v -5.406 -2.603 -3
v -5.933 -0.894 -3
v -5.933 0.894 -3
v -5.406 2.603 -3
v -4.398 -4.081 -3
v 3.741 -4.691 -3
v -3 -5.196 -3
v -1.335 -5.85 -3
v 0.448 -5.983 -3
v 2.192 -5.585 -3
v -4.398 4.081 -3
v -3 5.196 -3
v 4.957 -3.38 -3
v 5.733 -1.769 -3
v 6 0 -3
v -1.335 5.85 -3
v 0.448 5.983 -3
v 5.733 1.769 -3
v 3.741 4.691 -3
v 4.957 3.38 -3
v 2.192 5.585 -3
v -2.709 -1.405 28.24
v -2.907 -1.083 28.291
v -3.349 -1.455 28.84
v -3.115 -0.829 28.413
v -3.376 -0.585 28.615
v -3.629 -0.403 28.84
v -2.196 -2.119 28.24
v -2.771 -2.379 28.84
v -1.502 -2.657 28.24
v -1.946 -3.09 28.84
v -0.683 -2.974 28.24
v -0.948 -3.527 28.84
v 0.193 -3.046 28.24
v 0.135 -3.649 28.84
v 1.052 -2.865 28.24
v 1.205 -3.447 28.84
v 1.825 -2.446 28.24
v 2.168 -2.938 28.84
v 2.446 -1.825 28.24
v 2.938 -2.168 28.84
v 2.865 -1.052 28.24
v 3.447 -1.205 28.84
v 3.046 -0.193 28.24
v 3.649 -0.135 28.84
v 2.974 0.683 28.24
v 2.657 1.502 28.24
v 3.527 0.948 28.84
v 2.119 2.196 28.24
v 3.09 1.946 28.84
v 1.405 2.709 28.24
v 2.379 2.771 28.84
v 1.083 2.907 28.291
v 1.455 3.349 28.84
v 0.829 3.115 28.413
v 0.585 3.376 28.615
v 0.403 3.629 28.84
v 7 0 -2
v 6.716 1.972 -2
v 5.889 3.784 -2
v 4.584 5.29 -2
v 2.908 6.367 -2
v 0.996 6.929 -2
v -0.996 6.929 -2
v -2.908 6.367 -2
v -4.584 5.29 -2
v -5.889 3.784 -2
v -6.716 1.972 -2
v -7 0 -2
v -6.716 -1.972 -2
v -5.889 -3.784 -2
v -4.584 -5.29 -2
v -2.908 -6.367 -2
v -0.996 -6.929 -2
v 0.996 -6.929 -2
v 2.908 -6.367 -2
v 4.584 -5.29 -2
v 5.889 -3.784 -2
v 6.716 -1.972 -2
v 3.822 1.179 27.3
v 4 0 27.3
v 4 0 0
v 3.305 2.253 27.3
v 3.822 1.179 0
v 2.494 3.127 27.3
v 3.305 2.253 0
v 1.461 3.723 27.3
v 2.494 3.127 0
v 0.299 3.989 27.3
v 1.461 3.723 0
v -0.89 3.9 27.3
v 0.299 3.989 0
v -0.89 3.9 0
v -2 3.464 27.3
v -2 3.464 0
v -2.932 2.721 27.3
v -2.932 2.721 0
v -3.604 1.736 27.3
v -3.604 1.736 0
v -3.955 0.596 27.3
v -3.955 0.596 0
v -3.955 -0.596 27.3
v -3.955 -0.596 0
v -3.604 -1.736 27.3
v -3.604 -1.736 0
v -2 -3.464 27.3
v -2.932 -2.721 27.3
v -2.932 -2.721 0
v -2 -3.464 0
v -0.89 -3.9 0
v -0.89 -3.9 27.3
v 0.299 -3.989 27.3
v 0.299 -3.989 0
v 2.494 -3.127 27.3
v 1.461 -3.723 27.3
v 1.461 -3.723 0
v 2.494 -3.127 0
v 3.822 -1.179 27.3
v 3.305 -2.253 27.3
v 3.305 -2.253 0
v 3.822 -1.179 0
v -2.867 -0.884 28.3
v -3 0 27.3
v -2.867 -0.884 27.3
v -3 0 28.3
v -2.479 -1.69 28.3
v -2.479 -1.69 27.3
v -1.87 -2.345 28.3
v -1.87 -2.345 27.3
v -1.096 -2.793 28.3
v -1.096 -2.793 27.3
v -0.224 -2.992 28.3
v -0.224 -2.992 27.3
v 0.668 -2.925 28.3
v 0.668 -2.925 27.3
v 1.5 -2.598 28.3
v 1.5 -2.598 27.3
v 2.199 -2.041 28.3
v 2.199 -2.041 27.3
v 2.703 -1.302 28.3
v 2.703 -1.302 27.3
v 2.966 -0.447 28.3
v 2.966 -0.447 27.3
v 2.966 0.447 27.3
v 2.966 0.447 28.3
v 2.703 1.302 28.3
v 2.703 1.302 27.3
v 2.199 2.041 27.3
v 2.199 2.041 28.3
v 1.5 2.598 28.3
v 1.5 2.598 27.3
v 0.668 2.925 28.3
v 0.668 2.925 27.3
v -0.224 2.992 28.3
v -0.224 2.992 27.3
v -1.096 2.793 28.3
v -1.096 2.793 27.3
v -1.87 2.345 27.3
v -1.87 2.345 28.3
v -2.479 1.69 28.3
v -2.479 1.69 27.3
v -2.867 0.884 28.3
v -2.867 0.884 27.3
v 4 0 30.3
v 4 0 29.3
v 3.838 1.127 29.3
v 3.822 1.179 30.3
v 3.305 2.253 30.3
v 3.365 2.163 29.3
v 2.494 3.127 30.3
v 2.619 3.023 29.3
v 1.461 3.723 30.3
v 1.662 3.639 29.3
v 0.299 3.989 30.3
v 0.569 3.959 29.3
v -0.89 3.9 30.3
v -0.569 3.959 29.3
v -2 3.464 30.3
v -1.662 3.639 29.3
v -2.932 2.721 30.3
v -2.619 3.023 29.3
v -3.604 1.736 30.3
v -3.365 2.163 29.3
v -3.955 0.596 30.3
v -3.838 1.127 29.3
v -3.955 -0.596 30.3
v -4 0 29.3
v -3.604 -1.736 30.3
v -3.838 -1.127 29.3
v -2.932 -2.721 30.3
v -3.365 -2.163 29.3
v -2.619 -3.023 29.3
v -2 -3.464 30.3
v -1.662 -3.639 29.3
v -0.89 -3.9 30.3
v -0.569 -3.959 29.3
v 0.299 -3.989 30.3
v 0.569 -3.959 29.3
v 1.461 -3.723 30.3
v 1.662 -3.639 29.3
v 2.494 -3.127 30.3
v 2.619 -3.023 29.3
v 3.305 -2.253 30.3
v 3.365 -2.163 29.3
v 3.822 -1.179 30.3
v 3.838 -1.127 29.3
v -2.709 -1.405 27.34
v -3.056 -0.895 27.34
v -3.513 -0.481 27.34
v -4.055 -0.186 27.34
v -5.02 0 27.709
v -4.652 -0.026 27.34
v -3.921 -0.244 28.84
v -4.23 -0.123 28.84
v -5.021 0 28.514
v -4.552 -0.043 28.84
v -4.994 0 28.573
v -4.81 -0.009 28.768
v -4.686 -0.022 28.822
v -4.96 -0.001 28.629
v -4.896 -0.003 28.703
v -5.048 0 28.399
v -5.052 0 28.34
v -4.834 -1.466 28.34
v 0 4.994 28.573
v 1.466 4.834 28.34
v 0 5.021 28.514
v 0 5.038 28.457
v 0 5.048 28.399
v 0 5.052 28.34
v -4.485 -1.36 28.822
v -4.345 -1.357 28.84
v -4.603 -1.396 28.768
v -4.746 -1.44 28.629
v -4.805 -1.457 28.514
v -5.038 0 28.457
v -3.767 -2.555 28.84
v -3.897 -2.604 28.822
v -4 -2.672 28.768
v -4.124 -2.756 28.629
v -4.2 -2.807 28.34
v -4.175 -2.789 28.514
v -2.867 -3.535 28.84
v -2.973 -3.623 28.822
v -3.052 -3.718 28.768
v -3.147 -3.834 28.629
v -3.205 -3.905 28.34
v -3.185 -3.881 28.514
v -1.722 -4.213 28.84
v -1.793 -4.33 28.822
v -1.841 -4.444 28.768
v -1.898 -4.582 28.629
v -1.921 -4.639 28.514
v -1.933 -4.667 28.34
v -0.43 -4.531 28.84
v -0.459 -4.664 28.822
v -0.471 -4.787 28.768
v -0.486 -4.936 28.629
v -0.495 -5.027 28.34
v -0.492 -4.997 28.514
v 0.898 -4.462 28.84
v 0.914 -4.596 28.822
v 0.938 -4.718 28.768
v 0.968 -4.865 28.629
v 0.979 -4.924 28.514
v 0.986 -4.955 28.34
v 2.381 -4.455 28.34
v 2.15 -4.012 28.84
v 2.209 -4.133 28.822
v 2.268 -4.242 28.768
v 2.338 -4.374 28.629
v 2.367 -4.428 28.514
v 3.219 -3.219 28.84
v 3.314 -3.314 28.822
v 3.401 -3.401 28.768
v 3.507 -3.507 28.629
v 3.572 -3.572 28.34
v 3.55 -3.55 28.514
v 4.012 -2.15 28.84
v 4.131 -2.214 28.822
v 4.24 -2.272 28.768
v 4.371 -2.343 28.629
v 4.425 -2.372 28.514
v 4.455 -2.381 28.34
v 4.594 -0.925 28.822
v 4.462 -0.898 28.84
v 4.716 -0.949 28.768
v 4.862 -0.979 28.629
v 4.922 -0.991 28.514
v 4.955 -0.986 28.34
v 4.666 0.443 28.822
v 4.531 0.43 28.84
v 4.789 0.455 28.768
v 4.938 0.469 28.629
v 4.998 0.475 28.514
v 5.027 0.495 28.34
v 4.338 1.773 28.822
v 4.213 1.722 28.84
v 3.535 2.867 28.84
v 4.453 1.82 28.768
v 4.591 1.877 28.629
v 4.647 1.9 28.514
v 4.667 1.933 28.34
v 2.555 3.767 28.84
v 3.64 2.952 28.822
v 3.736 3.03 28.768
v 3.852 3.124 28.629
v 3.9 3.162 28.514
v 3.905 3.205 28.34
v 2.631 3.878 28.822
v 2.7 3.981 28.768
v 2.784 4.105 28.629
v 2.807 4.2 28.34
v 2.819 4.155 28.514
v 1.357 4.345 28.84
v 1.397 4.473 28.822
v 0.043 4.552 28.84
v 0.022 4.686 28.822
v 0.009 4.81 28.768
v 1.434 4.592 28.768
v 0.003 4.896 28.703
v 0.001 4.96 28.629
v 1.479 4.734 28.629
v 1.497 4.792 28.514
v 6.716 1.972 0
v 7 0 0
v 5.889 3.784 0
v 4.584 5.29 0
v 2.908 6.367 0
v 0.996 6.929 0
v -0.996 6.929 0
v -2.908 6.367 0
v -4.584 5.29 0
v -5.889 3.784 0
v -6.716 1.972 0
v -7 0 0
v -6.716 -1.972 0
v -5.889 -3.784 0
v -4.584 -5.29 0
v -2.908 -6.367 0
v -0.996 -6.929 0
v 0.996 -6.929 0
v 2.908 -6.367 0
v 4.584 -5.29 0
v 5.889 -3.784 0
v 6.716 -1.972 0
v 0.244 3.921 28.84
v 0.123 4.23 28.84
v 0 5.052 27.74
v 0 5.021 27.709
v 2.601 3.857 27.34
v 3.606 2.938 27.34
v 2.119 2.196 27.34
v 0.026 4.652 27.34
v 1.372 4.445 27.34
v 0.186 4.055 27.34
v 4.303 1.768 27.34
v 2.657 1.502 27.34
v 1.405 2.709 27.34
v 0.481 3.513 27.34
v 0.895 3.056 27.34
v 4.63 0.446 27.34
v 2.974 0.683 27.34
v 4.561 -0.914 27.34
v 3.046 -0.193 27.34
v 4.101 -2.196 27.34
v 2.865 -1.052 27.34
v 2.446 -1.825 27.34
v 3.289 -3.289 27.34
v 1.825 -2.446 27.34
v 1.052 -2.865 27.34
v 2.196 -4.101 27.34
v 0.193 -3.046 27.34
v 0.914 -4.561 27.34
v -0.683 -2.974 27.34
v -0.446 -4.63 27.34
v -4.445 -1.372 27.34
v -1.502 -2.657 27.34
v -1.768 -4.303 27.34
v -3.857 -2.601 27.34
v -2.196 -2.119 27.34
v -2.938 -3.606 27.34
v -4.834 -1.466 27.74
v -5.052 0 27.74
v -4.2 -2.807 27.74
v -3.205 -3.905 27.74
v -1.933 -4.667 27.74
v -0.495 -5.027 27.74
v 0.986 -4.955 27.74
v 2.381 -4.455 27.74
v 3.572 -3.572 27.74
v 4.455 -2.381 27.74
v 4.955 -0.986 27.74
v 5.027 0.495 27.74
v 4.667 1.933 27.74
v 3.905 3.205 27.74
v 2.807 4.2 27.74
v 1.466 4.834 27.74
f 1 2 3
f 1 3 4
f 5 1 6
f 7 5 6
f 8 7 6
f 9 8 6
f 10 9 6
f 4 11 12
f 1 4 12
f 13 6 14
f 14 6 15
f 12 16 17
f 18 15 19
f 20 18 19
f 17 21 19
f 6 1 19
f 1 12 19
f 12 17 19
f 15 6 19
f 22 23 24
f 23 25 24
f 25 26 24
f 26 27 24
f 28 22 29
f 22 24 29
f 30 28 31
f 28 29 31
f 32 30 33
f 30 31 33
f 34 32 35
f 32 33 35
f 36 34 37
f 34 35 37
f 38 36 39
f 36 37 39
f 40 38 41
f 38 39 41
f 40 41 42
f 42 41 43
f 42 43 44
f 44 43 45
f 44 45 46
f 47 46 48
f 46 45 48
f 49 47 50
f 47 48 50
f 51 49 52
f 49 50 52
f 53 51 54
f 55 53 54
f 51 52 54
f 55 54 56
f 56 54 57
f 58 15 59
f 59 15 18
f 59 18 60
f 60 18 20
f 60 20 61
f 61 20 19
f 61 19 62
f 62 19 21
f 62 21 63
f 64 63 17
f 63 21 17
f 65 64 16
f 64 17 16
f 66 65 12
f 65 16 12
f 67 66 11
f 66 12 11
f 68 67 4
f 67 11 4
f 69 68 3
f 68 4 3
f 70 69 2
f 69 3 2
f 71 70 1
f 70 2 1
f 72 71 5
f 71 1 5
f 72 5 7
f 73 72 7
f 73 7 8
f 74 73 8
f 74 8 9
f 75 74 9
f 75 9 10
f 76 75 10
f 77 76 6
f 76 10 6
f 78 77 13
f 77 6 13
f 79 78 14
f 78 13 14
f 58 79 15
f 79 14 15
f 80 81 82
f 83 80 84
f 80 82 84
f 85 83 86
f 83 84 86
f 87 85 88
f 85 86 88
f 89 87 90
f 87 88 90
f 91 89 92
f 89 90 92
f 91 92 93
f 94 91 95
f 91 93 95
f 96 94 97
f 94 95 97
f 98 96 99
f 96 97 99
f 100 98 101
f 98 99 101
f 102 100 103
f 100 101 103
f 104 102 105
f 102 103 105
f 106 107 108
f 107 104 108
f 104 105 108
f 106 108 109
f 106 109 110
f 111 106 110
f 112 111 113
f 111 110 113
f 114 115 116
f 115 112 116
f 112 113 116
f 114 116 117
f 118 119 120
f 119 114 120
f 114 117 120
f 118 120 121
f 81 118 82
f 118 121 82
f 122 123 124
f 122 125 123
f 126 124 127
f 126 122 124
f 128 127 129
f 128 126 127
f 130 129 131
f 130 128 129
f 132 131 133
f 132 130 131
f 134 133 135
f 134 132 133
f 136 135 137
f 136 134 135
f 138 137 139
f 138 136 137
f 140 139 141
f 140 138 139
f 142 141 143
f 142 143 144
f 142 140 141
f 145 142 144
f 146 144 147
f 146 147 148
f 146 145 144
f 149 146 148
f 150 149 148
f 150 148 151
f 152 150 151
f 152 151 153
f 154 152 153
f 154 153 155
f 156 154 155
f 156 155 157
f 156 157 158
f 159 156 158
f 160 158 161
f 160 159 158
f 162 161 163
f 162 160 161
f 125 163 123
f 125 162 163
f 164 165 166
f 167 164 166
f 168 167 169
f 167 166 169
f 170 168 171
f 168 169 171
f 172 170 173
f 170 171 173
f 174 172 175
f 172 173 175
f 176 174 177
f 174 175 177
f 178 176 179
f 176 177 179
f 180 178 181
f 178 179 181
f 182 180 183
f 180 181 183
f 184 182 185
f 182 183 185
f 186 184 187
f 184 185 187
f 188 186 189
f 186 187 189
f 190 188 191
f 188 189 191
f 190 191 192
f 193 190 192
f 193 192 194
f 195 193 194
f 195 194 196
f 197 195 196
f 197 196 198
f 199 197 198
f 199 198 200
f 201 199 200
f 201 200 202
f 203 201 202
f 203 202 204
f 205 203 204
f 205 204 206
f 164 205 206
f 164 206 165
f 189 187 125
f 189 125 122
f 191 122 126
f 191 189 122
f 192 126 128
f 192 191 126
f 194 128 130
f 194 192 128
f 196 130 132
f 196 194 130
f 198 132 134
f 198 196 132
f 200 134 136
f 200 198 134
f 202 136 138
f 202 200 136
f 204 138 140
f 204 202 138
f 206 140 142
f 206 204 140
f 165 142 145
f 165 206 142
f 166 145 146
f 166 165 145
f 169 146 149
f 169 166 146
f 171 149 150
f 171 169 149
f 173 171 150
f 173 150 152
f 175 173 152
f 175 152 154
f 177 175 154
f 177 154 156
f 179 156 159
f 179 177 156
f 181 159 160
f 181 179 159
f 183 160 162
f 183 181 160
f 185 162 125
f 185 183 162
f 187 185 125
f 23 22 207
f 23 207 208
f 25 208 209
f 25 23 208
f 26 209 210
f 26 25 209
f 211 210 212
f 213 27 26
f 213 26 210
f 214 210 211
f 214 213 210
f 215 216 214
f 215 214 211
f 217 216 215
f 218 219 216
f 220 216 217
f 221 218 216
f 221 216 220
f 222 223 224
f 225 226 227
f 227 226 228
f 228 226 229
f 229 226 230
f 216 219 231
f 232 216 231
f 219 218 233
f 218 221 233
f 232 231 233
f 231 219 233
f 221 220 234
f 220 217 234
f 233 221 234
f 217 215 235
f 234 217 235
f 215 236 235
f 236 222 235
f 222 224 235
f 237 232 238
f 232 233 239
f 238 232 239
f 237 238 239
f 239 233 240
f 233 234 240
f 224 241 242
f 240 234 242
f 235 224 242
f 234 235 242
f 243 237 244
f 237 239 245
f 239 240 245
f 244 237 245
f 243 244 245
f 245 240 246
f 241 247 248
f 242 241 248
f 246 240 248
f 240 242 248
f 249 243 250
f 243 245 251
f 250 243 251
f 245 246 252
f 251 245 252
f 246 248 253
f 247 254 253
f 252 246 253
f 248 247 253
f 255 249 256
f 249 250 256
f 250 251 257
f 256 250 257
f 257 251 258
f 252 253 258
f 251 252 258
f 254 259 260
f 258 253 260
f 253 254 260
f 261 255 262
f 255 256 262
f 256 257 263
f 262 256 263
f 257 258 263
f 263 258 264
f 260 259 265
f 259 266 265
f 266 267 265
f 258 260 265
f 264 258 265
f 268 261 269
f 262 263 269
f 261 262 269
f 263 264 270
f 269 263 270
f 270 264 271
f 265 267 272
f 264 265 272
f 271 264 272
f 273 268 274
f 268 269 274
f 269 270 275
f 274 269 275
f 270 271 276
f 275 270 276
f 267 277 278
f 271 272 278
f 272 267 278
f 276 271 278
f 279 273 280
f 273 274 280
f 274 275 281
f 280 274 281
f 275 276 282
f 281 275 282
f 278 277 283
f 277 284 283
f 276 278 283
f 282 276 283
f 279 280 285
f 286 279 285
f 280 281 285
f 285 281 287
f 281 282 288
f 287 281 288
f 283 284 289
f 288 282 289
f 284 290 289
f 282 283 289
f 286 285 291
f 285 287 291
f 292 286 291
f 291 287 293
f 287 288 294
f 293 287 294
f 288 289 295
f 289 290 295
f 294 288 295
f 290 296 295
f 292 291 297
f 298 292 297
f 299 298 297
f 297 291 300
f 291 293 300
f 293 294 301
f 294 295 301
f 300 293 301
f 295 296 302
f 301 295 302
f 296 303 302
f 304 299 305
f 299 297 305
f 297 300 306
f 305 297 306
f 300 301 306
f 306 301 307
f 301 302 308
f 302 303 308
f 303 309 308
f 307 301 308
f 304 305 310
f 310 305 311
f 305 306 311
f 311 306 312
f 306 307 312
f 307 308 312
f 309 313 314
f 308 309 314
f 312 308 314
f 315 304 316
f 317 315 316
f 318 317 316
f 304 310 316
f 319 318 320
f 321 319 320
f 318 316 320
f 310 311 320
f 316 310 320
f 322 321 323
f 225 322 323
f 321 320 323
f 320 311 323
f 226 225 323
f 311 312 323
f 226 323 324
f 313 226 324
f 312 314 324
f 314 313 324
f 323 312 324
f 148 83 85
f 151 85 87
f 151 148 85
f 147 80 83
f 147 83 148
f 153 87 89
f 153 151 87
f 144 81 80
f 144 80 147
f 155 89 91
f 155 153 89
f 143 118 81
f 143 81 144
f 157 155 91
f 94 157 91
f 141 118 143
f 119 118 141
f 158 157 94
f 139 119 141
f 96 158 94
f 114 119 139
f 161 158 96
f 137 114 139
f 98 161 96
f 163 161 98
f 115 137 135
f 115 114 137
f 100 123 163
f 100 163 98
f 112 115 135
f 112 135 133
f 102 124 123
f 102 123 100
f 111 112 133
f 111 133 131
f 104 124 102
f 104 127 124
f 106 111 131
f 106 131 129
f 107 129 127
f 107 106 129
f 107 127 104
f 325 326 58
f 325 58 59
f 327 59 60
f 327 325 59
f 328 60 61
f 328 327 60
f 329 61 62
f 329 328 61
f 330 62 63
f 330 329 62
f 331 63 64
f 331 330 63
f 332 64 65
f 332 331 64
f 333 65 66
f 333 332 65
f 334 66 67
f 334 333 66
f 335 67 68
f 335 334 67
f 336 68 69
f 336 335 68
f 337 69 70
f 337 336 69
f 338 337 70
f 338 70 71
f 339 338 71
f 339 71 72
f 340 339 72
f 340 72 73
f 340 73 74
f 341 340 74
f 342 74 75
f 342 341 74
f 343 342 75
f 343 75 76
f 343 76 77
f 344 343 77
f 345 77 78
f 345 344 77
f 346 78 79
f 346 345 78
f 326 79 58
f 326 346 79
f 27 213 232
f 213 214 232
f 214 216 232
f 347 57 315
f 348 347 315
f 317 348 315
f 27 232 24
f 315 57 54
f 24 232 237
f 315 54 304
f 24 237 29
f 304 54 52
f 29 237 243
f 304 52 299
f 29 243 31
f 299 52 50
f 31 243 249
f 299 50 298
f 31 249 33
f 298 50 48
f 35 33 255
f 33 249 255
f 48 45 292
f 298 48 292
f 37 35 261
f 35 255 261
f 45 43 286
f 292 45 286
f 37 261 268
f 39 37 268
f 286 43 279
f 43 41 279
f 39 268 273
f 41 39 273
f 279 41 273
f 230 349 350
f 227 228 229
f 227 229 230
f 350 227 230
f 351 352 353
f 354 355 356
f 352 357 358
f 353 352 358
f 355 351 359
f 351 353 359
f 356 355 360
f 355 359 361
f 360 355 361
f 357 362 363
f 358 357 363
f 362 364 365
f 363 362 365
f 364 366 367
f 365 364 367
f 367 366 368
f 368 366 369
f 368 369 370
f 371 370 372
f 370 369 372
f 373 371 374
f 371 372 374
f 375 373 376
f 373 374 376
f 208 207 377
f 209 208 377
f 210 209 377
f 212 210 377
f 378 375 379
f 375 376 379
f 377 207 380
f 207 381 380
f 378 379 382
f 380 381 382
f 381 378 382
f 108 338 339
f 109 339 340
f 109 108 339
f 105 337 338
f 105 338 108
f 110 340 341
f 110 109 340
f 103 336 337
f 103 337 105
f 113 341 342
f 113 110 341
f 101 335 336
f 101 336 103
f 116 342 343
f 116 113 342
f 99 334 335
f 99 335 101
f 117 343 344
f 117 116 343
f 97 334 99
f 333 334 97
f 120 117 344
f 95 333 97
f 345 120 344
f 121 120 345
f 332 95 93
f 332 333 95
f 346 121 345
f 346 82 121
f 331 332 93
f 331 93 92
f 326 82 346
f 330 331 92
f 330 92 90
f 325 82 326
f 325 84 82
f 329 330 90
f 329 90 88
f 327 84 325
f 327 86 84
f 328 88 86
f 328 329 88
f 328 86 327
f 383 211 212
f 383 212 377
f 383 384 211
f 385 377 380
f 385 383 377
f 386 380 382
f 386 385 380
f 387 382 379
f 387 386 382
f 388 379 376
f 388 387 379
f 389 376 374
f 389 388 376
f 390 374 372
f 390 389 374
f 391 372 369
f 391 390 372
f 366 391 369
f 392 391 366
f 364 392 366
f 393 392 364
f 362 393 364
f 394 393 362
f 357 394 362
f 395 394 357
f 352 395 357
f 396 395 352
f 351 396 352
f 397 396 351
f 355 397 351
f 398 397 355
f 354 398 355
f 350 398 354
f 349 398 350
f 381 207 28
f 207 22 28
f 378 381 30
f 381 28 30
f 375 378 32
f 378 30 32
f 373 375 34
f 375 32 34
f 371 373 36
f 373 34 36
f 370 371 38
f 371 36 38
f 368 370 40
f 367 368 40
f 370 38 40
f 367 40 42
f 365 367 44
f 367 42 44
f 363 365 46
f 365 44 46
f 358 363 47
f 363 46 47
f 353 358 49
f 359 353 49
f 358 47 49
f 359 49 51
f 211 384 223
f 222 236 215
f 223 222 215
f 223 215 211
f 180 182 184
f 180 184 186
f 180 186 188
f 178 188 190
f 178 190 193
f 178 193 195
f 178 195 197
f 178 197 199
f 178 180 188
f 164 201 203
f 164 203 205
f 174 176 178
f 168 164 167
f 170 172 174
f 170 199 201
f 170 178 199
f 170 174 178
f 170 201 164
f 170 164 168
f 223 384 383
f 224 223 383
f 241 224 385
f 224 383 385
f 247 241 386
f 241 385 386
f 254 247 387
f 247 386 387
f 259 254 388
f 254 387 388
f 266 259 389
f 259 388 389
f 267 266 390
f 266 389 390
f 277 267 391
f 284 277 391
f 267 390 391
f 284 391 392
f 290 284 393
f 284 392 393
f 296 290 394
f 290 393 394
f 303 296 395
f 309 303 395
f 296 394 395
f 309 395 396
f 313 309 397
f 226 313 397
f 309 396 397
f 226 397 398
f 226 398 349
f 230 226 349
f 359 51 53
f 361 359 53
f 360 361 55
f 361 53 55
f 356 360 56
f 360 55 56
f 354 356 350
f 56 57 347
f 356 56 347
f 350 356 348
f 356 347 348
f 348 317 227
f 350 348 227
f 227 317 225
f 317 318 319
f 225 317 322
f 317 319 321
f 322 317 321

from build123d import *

# Parameters (mm, degrees)
F0_R         = 4
F1_DEPTH     = 30.3
F2_R         = 7
F3_DEPTH     = 3
F6_SIZE      = 1
F8_ANGLE     = 270
F9_R         = 2.6041880276
F10_T2_ANGLE = 298.457193056
F11_SIZE     = 0.4


# Not quite as in the source:
# - a fillet or chamfer that OpenCascade refuses, or shapes differently, is made with other operations: its cross-section is extruded or revolved along the edge and cut away or added


with BuildPart() as f1:
    # F0 (on Top) → F1 (new body)
    with BuildSketch(Plane.XY):
        Circle(F0_R)
    extrude(amount=F1_DEPTH)

    # F2 (on Top) → F3 (join)
    with BuildSketch(Plane.XY):
        Circle(F2_R)
    extrude(amount=-F3_DEPTH)

    # F4 (on Front) → F5 (revolve, cut)
    with BuildSketch(Plane.XZ):
        Polygon((-4, 29.3), (-4.1, 29.3), (-4.1, 27.3), (-3, 27.3), (-3, 28.3), align=None)
    revolve(axis=Axis((0, 0, 30.3), (0, 0, 1)), mode=Mode.SUBTRACT)

    # F6
    f6_edges = [f1.edges().sort_by_distance(p)[0] for p in [
        (-7, 0, -3),
    ]]
    chamfer(f6_edges, length=F6_SIZE)


with BuildPart() as f8:
    # F7 (on Front) → F8 (revolve)
    with BuildSketch(Plane.XZ):
        Polygon((-5.0517449093, 28.8404841072), (-5.0517449093, 27.3404841072), (-3.0517449093, 27.3404841072), (-3.0517449093, 28.2404841072), (-3.6517449093, 28.8404841072), align=None)
    revolve(axis=Axis((0, 0, 30.3), (0, 0, 1)), revolution_arc=F8_ANGLE)

    # F9
    f9_edges = [f8.edges().sort_by_distance(p)[0] for p in [
        (0, 3.051745, 27.790484),
        (-3.051745, 0, 27.790484),
    ]]
    fillet(f9_edges, radius=F9_R)

    # F10: fillet of radius 0.5 on 1 edges, made by hand

    # F10_s1 → F10_t2 (revolve, cut)
    with BuildSketch(Plane(origin=(0, 0, 0), x_dir=(0, 0, 1), z_dir=(0.2457912089, 0.9693227954, 0))):
        with BuildLine():
            ThreePointArc((28.8404841072, -4.5517449093), (28.6940374978, -4.9052982999), (28.3404841072, -5.0517449093))
            Line((28.3404841072, -5.0517449093), (28.8404841072, -5.0517449093))
            Line((28.8404841072, -5.0517449093), (28.8404841072, -4.5517449093))
        make_face()
    revolve(axis=Axis((0, 0, 28.8404841072), (0, 0, 1)), revolution_arc=F10_T2_ANGLE, mode=Mode.SUBTRACT)

    # F11
    f11_edges = [f8.edges().sort_by_distance(p)[0] for p in [
        (3.572123, -3.572123, 27.340484),
    ]]
    chamfer(f11_edges, length=F11_SIZE)


solid = Compound([f1.part, f8.part])
